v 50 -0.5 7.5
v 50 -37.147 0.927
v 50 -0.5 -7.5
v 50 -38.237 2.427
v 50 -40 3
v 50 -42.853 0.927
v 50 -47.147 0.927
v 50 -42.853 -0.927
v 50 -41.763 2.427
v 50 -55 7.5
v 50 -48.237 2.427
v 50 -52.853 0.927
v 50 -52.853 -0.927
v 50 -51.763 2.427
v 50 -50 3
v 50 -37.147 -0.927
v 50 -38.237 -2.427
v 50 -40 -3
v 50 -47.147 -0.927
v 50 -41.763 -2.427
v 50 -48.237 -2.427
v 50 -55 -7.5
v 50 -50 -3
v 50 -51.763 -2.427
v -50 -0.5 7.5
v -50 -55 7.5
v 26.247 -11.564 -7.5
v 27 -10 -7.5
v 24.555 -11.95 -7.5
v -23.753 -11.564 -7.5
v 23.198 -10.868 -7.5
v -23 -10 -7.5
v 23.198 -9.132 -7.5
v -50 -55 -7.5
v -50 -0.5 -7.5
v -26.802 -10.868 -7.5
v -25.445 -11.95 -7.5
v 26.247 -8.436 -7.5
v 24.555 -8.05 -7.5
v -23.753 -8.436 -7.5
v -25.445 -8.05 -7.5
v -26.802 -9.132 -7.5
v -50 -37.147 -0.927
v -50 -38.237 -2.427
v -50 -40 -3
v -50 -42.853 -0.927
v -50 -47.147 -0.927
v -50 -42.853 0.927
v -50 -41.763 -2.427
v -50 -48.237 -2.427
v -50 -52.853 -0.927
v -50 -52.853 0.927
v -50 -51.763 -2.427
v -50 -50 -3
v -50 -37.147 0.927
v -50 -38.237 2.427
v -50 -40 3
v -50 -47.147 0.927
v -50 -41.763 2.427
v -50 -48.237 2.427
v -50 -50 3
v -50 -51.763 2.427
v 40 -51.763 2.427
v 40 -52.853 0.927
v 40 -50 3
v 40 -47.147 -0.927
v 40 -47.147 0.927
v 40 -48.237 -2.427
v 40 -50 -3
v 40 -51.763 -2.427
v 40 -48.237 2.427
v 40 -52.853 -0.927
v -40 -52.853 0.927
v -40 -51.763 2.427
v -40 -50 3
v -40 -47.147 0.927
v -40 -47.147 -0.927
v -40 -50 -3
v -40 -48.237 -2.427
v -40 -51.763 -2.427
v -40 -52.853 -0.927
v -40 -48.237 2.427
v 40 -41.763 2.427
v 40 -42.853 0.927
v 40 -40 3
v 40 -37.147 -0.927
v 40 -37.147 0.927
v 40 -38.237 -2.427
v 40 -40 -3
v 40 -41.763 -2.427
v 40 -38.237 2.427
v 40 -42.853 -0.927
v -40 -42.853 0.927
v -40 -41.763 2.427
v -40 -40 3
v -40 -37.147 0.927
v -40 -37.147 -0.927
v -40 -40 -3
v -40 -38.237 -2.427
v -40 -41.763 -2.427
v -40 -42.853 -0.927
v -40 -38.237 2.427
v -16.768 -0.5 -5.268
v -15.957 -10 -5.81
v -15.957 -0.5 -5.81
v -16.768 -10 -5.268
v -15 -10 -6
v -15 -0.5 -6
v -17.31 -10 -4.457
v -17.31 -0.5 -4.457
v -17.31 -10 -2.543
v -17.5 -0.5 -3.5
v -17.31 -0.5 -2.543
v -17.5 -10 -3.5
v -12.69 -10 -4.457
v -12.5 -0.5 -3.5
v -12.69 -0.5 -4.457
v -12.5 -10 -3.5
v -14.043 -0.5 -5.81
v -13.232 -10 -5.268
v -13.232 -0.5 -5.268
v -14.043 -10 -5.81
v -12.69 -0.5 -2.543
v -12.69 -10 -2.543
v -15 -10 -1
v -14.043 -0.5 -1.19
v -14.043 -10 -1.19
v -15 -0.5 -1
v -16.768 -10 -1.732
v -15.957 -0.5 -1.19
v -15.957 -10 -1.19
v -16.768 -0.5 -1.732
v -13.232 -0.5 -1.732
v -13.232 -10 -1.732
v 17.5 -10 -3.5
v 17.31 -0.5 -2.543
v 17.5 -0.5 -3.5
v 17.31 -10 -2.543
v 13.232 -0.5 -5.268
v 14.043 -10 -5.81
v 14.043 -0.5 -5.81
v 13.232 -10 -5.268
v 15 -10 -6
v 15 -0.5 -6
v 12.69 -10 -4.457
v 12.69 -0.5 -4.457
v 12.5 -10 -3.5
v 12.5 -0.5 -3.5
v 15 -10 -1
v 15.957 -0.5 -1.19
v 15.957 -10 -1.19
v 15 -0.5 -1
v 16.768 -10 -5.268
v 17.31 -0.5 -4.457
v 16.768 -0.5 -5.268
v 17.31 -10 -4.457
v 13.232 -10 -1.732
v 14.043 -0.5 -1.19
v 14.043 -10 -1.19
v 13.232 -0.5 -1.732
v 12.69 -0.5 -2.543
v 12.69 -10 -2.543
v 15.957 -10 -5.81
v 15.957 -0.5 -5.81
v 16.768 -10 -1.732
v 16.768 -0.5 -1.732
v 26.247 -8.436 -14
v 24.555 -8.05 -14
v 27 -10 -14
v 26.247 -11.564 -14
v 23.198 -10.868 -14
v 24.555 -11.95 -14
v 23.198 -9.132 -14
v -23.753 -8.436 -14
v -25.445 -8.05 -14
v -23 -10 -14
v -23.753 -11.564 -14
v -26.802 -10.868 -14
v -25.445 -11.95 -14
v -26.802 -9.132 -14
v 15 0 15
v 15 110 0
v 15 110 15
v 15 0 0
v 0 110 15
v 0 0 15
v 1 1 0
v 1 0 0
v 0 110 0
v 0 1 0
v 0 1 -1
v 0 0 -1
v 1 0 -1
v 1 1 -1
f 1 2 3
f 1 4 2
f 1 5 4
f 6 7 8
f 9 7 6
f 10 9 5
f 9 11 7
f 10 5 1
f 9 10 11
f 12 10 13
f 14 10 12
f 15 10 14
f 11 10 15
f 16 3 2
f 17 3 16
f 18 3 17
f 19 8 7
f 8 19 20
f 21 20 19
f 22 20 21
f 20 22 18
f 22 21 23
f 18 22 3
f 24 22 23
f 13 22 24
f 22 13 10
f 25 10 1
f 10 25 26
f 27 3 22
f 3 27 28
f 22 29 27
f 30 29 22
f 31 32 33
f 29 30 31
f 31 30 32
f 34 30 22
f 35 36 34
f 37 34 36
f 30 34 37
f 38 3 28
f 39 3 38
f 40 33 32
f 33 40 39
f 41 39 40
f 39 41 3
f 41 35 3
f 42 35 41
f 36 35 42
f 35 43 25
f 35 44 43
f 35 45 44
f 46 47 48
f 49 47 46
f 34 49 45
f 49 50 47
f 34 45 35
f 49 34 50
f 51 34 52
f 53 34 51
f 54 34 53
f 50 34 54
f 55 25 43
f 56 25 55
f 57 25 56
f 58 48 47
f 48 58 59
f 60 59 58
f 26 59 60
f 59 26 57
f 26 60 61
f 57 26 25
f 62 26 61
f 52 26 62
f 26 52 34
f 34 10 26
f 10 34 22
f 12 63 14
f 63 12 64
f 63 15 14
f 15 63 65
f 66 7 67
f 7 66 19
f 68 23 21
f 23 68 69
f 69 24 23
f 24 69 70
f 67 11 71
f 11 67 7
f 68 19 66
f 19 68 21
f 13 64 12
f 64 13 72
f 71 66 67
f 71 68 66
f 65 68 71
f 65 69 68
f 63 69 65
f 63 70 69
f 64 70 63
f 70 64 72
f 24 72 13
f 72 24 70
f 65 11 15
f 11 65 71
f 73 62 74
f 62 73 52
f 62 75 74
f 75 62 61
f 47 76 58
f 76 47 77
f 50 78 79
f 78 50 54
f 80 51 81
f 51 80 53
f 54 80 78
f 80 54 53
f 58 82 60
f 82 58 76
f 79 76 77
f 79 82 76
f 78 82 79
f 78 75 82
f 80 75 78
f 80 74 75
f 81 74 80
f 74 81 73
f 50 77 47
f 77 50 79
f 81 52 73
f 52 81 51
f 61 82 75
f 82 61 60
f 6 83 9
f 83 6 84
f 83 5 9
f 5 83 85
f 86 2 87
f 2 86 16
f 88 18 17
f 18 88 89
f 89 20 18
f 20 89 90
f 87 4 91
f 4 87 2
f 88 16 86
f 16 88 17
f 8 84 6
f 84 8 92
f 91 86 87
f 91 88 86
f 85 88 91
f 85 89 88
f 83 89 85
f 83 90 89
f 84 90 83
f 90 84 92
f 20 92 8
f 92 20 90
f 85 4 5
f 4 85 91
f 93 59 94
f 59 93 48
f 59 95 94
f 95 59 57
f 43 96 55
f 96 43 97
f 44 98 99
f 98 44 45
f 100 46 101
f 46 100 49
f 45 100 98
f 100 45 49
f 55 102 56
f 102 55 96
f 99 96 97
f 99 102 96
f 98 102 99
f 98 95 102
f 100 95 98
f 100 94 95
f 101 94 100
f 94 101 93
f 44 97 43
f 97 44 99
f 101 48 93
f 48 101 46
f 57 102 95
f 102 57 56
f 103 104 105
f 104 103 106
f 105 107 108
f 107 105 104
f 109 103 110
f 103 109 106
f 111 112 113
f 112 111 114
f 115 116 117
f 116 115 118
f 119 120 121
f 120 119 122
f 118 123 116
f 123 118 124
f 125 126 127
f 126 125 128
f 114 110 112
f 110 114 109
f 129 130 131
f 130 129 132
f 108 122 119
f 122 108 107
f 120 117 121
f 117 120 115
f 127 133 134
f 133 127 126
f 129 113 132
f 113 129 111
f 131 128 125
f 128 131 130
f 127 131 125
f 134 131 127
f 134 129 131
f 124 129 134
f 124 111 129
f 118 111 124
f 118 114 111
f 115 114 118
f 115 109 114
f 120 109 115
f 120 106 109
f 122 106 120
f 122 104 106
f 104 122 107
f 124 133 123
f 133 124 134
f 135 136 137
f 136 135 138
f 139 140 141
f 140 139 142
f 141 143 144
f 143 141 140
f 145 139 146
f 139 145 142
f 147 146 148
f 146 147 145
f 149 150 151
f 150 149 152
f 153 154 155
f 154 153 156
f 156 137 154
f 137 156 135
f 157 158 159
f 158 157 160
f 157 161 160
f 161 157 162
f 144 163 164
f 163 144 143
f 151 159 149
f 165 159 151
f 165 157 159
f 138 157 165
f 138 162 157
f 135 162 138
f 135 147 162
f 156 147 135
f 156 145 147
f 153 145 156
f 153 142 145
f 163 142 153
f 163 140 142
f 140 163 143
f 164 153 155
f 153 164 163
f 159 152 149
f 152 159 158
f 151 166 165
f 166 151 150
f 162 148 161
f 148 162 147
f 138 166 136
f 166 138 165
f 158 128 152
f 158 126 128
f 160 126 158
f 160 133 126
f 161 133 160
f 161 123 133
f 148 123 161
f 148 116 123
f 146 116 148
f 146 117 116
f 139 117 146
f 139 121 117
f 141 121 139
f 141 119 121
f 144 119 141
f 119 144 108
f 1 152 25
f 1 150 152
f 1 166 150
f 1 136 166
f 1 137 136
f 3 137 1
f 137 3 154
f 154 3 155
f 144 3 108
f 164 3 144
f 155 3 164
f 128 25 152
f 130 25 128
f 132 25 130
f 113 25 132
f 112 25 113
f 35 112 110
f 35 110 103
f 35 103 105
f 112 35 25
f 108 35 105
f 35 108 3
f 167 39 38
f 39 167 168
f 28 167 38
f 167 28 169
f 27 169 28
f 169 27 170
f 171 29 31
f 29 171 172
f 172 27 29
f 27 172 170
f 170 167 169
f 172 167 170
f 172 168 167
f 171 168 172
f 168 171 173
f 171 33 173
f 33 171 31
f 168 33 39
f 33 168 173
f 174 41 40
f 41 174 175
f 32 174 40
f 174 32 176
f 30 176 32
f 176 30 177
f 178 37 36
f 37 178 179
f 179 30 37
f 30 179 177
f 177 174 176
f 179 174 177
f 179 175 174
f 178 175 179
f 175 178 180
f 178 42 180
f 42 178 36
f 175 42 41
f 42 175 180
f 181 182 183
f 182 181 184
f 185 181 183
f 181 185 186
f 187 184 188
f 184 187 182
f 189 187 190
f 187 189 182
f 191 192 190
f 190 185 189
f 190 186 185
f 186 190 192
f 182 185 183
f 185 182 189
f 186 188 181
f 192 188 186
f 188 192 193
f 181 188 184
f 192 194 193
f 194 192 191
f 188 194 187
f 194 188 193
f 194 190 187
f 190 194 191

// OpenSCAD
module frame(){
    difference(){
        difference(){
            difference(){
                // frame bottom
                scale([100,110,15])
                    cube([1,1,1],center = true);
                // frame hole
    //            scale([80,105,10])
    //                translate([0,0,0.5])
    //                cube([1,1,1],center = true);
                rotate([0,90,0])            
                    scale([1,1,1])
                        translate([0,-50,40])
                            cylinder(20,3,3);
                rotate([0,90,0])
                    scale([1,1,1])
                        translate([0,-50,-60])
                            cylinder(20,3,3);
                rotate([0,90,0])            
                    scale([1,1,1])
                        translate([0,-40,40])
                            cylinder(20,3,3);
                rotate([0,90,0])
                    scale([1,1,1])
                        translate([0,-40,-60])
                            cylinder(20,3,3);
                rotate([0,90,90])
                    scale([0.5,0.5,2])
                        translate([7,30,-5])
                            cylinder(10,5,5);
                rotate([0,90,90])
                    scale([0.5,0.5,2])
                        translate([7,-30,-5])
                            cylinder(10,5,5);


            }
            cube([1000,1,100],center=true);
        }
        translate([-600,0,-20])
            cube([1000,60,50]);
    }
        //scale([1,1,1])
    //    translate([25,40,-14])
    //        cylinder(10,5,5);
    scale([1,1,1])
        translate([25,-10,-14])
            cylinder(10,2,2);
    //scale([1,1,1])
    //    translate([-25,40,-14])
    //        cylinder(10,5,5);
    scale([1,1,1])
        translate([-25,-10,-14])
            cylinder(10,2,2);
}

frame();


module beam(){
    cube([15,110,15]);
    rotate([0,90,0])
        cube([]);
}
beam();
